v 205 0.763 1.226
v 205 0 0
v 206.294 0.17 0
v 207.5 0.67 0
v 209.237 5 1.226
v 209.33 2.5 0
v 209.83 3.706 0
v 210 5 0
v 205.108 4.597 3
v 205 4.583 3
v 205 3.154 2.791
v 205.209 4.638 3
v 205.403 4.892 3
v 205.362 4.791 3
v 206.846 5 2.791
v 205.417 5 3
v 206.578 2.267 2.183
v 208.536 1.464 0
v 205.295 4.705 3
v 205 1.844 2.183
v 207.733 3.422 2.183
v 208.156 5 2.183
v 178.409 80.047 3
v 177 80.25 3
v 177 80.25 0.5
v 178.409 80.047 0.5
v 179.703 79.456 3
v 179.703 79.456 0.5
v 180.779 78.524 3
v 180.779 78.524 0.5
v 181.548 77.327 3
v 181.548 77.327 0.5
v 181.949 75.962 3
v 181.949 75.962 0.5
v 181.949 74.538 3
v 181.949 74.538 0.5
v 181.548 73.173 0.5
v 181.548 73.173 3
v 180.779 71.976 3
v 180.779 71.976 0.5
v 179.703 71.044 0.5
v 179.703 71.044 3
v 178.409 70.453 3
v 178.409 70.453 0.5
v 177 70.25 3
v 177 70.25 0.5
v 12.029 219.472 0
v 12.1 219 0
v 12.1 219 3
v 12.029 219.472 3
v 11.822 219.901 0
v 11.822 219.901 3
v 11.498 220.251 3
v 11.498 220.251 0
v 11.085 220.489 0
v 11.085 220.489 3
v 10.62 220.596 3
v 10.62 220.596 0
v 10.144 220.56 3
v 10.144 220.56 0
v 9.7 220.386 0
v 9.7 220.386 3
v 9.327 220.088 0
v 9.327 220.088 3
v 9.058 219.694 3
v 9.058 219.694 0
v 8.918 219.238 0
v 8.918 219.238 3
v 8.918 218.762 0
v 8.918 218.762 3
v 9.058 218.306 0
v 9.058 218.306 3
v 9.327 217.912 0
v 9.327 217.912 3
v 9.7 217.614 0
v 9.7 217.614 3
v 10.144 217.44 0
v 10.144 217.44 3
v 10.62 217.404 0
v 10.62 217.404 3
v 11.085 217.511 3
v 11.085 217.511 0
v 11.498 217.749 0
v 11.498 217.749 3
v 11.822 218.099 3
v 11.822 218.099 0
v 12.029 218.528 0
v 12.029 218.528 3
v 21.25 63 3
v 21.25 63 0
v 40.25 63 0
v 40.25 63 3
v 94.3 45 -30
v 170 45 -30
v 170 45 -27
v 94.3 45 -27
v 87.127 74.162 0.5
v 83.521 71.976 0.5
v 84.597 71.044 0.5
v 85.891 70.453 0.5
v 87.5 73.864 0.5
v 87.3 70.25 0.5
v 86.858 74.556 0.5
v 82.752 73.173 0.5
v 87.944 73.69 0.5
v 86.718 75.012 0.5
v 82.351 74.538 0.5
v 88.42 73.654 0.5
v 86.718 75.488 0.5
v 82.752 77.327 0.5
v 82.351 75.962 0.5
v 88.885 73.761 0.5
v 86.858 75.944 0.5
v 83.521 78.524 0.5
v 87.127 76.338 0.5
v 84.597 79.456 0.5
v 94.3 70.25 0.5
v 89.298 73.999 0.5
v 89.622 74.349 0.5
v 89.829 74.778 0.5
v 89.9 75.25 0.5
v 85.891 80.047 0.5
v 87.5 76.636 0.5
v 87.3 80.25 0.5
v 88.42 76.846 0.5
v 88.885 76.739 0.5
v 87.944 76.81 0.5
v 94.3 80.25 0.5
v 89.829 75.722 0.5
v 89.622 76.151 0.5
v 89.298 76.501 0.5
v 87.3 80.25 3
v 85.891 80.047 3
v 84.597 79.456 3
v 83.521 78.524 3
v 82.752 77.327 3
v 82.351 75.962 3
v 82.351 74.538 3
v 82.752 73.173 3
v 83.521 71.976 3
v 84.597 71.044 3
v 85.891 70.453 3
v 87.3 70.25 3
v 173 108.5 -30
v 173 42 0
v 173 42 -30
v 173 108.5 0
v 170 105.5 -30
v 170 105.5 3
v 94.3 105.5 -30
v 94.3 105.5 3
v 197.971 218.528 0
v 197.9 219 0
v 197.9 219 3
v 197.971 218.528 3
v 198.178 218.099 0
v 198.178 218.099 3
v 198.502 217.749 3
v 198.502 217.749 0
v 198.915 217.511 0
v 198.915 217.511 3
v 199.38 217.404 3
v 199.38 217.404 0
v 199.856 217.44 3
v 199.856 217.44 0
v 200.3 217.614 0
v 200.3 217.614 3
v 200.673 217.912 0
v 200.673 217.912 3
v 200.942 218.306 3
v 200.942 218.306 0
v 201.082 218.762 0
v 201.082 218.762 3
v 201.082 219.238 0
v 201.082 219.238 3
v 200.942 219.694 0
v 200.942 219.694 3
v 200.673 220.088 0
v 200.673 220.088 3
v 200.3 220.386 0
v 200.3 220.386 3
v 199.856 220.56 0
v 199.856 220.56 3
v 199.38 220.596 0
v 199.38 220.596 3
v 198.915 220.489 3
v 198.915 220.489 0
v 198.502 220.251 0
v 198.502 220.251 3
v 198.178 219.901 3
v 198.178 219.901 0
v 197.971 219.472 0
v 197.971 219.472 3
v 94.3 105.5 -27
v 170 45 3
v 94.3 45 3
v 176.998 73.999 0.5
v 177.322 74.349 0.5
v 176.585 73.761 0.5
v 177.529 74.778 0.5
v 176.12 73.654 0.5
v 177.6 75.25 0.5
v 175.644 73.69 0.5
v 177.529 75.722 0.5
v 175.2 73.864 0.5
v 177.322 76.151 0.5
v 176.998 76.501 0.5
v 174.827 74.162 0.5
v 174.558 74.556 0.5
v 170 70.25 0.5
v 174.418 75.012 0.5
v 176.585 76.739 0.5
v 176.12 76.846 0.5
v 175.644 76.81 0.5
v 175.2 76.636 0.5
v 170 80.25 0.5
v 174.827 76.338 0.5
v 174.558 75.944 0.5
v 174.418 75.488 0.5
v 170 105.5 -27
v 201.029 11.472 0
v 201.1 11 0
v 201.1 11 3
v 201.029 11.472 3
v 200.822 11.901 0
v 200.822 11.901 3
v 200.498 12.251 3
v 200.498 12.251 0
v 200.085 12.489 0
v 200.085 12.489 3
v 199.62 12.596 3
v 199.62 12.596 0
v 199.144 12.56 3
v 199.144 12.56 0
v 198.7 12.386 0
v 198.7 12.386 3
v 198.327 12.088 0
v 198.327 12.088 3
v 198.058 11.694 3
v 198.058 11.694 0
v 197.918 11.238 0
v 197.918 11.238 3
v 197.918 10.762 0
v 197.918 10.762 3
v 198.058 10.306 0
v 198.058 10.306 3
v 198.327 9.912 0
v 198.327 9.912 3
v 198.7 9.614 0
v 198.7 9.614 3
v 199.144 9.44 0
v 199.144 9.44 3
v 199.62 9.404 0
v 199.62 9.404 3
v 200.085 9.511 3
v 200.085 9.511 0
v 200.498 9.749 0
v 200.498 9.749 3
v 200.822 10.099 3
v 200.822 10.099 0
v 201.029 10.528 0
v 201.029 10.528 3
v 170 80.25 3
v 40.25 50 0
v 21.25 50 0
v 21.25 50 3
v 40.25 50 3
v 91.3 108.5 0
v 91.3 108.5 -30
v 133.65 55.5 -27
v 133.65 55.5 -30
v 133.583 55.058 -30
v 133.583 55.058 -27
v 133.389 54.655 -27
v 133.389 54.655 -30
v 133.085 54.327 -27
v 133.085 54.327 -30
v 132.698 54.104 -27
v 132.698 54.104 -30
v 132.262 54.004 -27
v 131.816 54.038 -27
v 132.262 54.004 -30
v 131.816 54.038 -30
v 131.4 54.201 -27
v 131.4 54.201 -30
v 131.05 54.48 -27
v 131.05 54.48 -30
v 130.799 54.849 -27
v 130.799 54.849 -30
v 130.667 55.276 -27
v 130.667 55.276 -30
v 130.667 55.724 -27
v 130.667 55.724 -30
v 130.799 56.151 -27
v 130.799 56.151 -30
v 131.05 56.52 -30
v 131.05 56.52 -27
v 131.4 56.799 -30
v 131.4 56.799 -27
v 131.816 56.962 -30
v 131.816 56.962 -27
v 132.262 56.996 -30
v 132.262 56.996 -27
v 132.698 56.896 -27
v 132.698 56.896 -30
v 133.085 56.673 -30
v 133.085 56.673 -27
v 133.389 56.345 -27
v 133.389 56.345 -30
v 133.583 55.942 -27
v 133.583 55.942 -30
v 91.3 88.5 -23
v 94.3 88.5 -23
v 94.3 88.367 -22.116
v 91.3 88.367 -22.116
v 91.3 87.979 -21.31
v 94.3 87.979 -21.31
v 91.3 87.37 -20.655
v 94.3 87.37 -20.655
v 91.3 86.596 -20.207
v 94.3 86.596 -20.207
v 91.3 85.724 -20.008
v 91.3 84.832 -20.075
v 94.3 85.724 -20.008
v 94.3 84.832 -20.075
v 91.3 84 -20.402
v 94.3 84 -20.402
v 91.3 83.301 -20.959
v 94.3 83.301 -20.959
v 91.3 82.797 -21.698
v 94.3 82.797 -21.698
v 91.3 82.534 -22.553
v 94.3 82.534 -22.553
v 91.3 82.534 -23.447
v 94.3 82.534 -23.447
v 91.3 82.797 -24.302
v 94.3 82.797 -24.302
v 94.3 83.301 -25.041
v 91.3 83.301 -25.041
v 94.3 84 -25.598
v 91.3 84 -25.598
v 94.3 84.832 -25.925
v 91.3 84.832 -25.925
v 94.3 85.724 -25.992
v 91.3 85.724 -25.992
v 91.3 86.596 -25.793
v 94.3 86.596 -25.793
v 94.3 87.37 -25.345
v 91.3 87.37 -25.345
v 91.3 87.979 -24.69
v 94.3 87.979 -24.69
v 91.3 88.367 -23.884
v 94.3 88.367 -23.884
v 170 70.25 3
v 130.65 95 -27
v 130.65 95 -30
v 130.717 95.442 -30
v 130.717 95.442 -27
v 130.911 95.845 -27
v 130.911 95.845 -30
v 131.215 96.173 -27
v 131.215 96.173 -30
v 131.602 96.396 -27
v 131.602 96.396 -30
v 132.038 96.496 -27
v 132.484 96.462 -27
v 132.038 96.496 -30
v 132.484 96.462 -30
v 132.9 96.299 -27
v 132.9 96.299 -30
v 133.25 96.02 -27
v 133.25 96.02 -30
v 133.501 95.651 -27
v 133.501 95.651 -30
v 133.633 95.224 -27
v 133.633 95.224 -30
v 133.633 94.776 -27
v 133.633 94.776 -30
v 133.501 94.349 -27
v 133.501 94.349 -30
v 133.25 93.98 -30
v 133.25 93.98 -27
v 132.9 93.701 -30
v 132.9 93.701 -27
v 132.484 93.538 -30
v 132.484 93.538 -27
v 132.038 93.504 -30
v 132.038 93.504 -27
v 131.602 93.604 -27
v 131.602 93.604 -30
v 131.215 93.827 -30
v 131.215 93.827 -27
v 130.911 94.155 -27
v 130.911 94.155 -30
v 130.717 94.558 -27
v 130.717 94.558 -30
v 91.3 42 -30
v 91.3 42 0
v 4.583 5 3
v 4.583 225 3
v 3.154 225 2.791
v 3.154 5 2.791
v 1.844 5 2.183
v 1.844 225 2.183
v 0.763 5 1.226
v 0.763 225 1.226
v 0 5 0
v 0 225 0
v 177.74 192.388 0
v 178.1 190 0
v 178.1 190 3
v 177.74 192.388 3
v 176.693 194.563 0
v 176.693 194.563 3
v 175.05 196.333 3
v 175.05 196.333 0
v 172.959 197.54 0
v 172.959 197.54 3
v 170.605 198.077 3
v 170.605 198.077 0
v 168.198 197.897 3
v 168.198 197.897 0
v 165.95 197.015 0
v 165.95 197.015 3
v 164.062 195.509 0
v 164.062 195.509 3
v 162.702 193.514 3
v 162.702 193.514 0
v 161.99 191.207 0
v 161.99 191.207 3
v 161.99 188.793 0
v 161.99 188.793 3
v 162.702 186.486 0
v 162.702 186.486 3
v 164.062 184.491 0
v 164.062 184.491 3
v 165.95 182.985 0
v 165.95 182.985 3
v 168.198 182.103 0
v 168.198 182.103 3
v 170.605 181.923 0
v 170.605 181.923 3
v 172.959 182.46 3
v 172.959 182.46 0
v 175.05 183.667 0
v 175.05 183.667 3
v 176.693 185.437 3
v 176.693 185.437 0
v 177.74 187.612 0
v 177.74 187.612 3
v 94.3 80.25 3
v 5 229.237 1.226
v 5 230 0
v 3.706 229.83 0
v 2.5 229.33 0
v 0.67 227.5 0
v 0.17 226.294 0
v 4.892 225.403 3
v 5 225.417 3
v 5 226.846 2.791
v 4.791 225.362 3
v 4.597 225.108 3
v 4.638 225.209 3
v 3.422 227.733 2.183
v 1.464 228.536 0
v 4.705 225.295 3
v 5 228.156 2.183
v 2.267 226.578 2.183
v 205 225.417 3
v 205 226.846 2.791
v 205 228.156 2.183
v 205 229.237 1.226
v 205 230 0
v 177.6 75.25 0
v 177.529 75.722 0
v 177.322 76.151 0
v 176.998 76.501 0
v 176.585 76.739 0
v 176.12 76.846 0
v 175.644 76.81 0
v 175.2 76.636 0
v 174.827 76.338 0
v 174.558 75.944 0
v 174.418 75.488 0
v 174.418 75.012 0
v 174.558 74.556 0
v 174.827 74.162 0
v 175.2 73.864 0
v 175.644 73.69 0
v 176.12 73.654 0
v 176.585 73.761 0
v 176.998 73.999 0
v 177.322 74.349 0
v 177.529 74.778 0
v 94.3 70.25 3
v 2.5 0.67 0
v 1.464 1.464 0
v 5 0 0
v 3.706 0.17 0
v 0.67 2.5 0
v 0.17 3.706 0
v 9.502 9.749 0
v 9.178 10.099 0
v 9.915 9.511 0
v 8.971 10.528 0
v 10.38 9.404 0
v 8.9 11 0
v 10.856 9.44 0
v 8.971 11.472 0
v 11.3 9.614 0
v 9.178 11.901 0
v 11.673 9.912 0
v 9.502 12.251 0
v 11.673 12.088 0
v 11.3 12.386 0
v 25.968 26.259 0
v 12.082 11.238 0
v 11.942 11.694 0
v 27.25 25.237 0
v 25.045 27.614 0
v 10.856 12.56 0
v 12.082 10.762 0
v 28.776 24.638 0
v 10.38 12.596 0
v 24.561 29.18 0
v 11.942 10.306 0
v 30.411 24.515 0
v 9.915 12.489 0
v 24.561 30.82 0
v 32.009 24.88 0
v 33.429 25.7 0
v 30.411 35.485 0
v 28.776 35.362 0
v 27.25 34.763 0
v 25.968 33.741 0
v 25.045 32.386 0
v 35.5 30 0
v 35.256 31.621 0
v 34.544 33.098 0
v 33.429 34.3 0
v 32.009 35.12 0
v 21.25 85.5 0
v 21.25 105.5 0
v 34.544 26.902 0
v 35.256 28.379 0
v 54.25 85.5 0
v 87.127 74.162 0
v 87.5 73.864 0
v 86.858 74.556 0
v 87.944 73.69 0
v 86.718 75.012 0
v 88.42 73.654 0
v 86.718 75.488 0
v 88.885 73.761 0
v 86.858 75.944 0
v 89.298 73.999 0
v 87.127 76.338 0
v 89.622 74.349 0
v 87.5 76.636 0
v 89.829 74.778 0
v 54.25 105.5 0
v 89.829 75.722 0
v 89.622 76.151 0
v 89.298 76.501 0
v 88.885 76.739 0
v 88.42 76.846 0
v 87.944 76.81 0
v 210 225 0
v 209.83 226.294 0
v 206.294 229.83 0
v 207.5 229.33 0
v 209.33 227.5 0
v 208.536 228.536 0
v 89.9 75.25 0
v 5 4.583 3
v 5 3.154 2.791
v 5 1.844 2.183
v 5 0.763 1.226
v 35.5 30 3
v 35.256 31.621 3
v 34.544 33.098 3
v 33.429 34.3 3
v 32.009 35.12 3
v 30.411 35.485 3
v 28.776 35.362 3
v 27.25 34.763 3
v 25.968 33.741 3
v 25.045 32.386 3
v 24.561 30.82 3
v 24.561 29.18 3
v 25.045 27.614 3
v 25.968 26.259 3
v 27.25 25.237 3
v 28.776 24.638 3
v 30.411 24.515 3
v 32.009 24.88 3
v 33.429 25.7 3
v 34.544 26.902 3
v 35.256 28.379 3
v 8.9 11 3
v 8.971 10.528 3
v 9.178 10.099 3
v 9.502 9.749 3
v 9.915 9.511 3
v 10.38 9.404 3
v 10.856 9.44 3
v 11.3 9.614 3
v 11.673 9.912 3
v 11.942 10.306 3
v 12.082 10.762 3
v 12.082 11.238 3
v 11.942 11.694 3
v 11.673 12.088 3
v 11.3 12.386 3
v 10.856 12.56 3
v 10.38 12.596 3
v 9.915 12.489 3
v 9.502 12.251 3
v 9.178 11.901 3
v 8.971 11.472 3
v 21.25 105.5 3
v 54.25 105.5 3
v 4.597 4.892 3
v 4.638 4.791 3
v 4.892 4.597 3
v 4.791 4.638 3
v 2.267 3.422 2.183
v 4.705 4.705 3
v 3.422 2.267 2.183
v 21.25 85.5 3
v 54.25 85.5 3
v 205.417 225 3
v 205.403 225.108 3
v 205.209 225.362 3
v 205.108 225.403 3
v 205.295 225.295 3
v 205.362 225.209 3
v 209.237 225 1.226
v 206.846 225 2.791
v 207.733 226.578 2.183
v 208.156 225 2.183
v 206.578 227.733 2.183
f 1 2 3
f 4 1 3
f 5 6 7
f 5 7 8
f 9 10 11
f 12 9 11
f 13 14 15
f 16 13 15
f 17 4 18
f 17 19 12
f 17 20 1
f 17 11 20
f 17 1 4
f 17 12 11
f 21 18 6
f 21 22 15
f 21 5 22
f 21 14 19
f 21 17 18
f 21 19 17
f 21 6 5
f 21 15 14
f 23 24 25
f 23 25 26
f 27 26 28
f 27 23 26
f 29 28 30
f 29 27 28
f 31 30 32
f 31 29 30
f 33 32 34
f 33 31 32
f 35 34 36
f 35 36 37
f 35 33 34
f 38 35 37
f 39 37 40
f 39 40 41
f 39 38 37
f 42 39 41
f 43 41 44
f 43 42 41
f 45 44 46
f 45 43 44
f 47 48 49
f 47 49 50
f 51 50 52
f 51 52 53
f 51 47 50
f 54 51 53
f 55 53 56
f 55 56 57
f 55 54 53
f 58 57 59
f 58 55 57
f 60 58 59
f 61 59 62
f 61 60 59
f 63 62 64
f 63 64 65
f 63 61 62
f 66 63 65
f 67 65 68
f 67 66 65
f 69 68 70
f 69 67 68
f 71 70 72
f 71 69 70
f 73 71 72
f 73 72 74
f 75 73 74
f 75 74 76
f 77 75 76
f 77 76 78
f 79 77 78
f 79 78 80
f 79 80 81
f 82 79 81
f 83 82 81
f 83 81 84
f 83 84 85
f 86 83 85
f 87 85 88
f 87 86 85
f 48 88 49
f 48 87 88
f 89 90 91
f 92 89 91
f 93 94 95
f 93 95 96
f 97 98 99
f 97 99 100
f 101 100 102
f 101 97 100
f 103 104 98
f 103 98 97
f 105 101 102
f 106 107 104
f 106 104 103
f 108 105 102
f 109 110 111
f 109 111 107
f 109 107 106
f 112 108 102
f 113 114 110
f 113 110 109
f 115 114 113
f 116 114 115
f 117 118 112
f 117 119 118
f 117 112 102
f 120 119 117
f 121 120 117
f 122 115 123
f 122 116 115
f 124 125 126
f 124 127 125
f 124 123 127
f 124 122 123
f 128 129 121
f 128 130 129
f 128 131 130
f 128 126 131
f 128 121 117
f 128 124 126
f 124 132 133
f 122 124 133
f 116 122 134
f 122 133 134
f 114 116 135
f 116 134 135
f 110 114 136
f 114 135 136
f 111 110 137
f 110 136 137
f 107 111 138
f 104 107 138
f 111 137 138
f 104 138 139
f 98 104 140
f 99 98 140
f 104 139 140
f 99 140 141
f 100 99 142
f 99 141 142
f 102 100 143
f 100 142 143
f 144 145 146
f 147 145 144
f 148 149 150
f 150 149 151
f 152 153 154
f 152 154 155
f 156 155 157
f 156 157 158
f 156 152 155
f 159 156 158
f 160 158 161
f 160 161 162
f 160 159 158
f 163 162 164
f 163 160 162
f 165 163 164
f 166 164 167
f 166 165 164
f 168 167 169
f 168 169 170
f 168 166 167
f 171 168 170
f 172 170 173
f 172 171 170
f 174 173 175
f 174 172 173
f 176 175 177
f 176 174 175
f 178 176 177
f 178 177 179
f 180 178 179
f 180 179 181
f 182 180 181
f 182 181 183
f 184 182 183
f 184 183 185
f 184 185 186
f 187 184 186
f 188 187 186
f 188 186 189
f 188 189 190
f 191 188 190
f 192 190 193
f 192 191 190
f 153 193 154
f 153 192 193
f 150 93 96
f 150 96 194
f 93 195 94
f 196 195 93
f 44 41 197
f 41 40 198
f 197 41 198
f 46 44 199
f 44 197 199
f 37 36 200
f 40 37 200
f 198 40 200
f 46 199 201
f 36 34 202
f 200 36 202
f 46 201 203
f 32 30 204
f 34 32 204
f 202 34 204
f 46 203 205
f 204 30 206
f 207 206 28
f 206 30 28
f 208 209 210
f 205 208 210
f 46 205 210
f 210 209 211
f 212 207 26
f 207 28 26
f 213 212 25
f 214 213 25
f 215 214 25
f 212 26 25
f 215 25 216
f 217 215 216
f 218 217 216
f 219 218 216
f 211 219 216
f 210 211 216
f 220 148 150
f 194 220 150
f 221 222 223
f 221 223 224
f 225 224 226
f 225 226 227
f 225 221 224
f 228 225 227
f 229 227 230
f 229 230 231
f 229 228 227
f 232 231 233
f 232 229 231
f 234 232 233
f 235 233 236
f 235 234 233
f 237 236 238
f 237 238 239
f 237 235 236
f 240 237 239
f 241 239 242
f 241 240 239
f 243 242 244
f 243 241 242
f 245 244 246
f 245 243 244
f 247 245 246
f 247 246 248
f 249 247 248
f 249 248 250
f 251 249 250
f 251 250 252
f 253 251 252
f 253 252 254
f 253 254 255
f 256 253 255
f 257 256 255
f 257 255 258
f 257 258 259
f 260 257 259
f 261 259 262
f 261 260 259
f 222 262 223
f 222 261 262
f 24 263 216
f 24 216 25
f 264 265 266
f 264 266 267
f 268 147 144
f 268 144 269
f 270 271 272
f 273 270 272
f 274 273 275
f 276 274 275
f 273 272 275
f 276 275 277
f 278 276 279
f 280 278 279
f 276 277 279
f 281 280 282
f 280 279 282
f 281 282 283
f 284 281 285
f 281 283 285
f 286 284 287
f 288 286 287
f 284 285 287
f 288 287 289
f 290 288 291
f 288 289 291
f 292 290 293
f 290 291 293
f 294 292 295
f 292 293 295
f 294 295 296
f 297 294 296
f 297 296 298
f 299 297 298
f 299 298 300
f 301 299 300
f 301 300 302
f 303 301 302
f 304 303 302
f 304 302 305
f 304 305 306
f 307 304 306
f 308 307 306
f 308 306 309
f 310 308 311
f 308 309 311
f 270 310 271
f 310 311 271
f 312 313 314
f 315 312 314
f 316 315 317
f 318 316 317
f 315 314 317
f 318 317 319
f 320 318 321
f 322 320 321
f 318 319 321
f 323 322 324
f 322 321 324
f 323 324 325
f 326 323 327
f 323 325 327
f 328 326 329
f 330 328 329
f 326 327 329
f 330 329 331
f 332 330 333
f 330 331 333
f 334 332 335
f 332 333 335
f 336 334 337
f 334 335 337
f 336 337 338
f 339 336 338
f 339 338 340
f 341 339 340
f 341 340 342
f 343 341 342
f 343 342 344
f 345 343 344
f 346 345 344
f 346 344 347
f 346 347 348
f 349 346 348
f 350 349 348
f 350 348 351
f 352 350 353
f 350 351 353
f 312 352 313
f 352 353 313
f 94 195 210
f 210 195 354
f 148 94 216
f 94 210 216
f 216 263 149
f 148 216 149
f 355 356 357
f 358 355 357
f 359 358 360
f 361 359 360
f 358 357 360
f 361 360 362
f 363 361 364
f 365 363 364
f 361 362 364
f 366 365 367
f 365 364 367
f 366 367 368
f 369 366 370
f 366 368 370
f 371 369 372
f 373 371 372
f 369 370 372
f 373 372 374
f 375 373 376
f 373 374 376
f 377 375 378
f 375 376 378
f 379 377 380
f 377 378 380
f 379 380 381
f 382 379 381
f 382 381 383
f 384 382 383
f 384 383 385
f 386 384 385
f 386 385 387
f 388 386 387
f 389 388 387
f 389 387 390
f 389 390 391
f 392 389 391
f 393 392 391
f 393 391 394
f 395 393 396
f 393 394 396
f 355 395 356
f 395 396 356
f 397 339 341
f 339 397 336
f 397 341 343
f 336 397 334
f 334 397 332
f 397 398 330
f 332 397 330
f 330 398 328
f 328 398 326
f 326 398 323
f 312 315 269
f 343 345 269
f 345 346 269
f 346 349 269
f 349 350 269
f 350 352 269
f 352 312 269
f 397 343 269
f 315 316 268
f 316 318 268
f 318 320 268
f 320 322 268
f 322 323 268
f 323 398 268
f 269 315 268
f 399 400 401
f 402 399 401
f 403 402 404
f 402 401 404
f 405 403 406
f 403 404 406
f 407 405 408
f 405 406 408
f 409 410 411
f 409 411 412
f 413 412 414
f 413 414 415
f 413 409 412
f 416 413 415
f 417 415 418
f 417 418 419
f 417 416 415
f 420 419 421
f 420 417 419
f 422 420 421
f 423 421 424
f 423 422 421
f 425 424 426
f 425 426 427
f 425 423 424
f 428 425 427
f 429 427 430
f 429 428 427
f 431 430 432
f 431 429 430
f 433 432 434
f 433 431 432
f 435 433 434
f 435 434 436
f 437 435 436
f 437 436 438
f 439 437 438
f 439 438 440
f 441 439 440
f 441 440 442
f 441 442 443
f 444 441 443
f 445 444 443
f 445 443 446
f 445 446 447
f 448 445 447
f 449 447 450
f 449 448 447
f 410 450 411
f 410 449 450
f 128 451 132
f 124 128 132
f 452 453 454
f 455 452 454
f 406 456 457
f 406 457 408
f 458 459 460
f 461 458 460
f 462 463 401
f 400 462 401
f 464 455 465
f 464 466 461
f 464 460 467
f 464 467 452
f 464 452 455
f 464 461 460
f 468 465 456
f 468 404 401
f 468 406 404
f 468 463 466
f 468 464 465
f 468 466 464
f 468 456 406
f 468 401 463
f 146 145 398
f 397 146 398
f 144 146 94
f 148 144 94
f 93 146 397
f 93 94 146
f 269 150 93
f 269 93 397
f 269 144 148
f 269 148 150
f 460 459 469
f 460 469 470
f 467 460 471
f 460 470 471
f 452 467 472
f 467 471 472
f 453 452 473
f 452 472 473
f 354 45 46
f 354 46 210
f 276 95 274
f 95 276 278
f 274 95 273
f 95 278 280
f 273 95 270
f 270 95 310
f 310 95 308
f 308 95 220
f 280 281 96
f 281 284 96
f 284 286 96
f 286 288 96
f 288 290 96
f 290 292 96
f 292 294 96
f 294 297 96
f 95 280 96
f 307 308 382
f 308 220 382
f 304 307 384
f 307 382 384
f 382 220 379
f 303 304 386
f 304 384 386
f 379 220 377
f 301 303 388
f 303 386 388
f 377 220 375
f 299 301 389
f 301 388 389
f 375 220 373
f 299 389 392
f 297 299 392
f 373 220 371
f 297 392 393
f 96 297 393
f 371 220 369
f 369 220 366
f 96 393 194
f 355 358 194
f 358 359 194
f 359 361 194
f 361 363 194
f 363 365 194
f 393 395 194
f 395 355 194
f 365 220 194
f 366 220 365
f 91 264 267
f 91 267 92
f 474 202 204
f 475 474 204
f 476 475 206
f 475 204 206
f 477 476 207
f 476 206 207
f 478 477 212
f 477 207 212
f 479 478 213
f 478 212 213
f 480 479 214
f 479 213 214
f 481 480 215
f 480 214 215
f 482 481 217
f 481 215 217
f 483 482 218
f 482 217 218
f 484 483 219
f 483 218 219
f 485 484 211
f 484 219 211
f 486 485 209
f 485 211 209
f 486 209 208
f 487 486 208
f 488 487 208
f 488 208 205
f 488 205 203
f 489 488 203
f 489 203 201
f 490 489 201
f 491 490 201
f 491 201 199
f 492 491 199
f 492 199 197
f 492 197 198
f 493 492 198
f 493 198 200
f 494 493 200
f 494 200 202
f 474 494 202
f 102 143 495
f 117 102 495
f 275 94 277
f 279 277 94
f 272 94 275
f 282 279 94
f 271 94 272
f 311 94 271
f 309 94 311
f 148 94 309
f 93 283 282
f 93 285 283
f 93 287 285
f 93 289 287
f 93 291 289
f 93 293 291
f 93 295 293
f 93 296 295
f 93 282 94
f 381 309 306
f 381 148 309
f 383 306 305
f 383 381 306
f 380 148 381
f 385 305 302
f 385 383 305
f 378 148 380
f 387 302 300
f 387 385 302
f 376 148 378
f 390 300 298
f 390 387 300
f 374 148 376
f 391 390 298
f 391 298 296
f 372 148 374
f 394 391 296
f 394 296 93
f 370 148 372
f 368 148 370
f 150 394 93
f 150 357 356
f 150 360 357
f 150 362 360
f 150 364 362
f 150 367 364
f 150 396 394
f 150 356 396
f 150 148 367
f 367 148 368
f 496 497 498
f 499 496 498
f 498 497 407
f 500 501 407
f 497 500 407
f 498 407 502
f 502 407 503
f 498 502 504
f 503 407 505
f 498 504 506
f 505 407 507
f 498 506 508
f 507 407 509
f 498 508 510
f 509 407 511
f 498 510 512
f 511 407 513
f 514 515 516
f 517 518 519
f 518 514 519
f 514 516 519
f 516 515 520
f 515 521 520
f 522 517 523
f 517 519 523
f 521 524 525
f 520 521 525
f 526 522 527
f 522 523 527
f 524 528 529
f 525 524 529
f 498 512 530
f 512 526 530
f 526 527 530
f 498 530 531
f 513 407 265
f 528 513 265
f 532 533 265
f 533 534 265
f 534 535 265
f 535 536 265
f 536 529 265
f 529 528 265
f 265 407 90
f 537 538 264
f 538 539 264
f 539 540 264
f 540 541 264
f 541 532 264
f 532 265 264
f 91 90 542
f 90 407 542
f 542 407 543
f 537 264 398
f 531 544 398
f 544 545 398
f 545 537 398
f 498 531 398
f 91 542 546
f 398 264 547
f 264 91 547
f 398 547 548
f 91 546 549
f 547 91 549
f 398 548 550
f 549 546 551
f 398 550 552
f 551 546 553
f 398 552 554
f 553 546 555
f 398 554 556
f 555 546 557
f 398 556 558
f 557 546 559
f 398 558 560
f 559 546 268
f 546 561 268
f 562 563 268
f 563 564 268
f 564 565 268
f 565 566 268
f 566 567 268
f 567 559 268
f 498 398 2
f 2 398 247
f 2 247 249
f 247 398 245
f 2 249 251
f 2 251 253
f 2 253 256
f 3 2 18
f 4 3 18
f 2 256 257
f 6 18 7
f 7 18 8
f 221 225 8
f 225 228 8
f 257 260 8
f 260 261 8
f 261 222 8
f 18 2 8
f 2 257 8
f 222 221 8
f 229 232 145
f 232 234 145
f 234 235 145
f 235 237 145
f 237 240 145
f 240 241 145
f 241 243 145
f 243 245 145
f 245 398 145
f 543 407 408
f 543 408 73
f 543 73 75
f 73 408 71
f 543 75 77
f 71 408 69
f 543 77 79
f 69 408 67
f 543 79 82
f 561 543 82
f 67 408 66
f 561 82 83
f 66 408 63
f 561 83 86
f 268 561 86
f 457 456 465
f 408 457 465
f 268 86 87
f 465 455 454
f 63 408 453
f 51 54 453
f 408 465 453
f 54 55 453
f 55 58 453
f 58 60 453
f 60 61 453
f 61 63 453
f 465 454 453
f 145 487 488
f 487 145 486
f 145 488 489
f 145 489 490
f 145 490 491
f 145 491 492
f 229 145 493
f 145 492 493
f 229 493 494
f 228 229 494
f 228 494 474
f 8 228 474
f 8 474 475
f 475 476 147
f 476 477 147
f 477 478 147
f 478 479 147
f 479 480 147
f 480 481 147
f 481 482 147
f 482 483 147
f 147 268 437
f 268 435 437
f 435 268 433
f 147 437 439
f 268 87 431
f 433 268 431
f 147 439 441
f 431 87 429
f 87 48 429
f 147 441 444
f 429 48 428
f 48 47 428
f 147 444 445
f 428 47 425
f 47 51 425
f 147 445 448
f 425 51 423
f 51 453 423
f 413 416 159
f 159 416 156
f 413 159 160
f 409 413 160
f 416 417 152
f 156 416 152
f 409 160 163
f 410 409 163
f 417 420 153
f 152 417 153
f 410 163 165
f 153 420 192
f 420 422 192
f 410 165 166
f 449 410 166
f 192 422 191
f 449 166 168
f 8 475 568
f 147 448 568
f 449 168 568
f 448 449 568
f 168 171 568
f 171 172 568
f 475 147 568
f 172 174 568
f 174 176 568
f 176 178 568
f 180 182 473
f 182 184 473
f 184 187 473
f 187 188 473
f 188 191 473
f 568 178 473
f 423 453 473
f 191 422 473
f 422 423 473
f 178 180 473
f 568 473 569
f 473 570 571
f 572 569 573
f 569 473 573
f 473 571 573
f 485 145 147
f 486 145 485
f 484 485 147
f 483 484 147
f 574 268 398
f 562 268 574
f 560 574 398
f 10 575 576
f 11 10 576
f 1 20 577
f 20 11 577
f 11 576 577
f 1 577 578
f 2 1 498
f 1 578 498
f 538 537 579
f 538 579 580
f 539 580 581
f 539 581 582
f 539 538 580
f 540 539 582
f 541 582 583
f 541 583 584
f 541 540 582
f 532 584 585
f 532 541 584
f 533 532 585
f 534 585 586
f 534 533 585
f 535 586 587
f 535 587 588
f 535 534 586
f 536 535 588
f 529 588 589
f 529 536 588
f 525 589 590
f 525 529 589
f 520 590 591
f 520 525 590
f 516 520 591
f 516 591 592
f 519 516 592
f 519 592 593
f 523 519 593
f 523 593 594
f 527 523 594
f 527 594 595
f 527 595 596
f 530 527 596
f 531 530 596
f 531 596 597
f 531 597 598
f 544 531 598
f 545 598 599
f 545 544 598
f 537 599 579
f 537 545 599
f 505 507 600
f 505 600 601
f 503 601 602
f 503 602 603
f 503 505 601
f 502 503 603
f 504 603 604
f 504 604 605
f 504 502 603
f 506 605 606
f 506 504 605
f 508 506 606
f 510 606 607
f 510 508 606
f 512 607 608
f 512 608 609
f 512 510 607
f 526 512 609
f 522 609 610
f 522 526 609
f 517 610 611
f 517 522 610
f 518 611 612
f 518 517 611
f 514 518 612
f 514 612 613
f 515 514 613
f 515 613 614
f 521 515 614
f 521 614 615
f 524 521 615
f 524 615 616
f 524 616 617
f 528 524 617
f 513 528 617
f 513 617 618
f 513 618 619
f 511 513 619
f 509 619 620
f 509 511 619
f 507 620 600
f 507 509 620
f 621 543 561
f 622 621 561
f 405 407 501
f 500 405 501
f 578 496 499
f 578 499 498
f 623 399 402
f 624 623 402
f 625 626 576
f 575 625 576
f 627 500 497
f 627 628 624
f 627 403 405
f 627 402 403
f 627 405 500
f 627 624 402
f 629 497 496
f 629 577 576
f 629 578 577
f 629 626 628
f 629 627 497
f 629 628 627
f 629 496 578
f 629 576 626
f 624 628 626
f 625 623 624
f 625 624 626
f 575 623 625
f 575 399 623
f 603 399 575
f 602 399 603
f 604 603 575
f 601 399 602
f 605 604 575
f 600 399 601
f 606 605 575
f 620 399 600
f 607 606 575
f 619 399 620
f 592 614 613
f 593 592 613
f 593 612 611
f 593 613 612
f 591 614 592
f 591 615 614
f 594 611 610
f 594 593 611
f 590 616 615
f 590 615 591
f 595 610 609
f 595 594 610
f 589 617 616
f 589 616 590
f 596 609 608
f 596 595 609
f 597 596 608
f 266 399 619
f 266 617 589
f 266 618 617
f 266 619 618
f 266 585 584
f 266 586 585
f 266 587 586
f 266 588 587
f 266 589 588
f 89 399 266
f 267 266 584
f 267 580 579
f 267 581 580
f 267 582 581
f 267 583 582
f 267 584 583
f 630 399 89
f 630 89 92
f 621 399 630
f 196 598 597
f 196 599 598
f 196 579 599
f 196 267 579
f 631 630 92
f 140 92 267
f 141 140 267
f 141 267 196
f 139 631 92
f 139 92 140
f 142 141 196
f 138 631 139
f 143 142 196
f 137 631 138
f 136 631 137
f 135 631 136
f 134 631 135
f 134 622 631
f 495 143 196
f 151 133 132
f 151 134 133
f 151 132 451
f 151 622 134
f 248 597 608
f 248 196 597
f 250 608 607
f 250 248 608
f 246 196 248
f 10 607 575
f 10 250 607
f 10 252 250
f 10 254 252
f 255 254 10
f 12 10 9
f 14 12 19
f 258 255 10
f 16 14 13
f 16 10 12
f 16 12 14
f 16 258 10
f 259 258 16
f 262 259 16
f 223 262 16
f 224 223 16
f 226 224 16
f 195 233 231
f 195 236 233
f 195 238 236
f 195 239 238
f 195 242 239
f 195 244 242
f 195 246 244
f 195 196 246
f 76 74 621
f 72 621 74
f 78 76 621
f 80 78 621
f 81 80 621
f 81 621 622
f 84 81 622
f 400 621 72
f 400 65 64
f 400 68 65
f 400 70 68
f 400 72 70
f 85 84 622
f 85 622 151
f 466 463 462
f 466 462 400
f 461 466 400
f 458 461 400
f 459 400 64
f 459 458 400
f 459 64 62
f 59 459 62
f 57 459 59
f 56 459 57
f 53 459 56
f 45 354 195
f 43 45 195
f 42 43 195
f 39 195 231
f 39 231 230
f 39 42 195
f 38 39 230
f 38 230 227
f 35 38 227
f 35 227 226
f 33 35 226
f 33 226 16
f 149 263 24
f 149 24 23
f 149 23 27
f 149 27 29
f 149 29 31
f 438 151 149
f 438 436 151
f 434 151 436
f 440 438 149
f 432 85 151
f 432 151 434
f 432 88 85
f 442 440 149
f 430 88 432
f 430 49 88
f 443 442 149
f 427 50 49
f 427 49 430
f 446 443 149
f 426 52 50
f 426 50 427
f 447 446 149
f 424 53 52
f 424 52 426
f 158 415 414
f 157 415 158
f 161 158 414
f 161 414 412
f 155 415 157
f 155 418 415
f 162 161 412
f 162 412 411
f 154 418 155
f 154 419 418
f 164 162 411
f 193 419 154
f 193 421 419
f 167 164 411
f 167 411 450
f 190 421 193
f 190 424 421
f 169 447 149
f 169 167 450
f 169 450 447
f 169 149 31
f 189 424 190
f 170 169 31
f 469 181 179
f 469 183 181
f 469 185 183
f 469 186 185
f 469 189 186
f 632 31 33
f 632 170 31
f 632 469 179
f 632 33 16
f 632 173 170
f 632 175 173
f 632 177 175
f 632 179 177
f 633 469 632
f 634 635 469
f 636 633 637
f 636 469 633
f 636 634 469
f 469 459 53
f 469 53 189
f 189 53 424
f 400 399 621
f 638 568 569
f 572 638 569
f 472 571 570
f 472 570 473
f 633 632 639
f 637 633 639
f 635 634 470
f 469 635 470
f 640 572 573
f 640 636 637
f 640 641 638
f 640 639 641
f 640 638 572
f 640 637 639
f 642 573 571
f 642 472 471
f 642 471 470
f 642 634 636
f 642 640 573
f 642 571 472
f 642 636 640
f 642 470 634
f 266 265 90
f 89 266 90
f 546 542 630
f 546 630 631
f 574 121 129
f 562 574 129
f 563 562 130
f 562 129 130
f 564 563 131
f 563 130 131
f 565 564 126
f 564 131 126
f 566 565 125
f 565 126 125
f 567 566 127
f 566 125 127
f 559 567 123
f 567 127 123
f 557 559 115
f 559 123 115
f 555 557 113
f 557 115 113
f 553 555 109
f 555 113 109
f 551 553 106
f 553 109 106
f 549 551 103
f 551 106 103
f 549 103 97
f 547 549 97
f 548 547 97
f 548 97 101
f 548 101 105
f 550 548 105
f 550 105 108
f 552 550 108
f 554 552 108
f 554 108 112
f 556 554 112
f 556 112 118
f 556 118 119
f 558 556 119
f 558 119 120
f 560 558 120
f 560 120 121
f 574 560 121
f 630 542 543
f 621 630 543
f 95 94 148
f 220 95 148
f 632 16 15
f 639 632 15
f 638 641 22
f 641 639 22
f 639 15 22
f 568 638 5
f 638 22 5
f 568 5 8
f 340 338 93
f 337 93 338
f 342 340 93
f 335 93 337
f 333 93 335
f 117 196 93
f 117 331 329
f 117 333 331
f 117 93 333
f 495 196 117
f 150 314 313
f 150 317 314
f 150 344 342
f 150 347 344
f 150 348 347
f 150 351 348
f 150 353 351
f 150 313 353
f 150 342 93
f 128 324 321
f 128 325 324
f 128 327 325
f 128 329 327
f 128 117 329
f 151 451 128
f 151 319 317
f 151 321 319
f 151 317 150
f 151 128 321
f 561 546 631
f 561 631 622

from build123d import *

# Parameters (mm, degrees)
SKETCH1_R           = 1.6
SKETCH1_R_2         = 8.1
SKETCH1_R_3         = 5.5
SKETCH1_W           = 19
SKETCH1_H           = 13
SKETCH1_W_2         = 75.7
SKETCH1_H_2         = 60.5
SKETCH1_W_3         = 33
SKETCH1_H_3         = 20
BOSS_EXTRUDE1_DEPTH = 3
SKETCH2_W           = 81.7
SKETCH2_H           = 66.5
SKETCH2_W_2         = 75.7
SKETCH2_H_2         = 60.5
BOSS_EXTRUDE2_DEPTH = 30
SKETCH3_W           = 75.7
SKETCH3_H           = 60.5
SKETCH3_R           = 1.5
BOSS_EXTRUDE3_DEPTH = 3
SKETCH4_R           = 3
CUT_EXTRUDE1_DEPTH  = 3
FILLET1_R           = 5
CUT_EXTRUDE2_DEPTH  = 2.5
SKETCH6_R           = 1.6
CUT_EXTRUDE3_DEPTH  = 313.938092919


with BuildPart() as part:
    # Sketch1 → Boss-Extrude1 (new body)
    with BuildSketch(Plane.XY):
        with BuildLine():
            Line((5, 0), (205, 0))
            ThreePointArc((205, 0), (208.535533906, 1.464466094), (210, 5))
            Line((210, 5), (210, 225))
            ThreePointArc((210, 225), (208.535533906, 228.535533906), (205, 230))
            Line((205, 230), (5, 230))
            ThreePointArc((5, 230), (1.464466094, 228.535533906), (0, 225))
            Line((0, 225), (0, 5))
            ThreePointArc((0, 5), (1.464466094, 1.464466094), (5, 0))
        make_face()
        with Locations((10.5, 219)):
            Circle(SKETCH1_R, mode=Mode.SUBTRACT)
        with Locations(Location((10.5, 11, 0), (0, 0, 180))):
            Circle(SKETCH1_R, mode=Mode.SUBTRACT)
        with Locations((199.5, 11)):
            Circle(SKETCH1_R, mode=Mode.SUBTRACT)
        with Locations(Location((199.5, 219, 0), (0, 0, 180))):
            Circle(SKETCH1_R, mode=Mode.SUBTRACT)
        with Locations((170, 190)):
            Circle(SKETCH1_R_2, mode=Mode.SUBTRACT)
        with Locations((30, 30)):
            Circle(SKETCH1_R_3, mode=Mode.SUBTRACT)
        with Locations((30.75, 56.5)):
            Rectangle(SKETCH1_W, SKETCH1_H, mode=Mode.SUBTRACT)
        with Locations((132.15, 75.25)):
            Rectangle(SKETCH1_W_2, SKETCH1_H_2, mode=Mode.SUBTRACT)
        with Locations((37.75, 95.5)):
            Rectangle(SKETCH1_W_3, SKETCH1_H_3, mode=Mode.SUBTRACT)
    extrude(amount=BOSS_EXTRUDE1_DEPTH)

    # Sketch2 → Boss-Extrude2 (add)
    with BuildSketch(Plane(origin=(0, 0, 0), x_dir=(-1, 0, 0), z_dir=(0, 0, -1))):
        with Locations((-132.15, 75.25)):
            Rectangle(SKETCH2_W, SKETCH2_H)
        with Locations((-132.15, 75.25)):
            Rectangle(SKETCH2_W_2, SKETCH2_H_2, mode=Mode.SUBTRACT)
    extrude(amount=BOSS_EXTRUDE2_DEPTH)

    # Sketch4 → Cut-Extrude1 (cut)
    with BuildSketch(Plane(origin=(94.3, 0, 0), x_dir=(0, 0, -1), z_dir=(1, 0, 0))):
        with Locations(Location((23, 85.5, 0), (0, 0, 90))):
            Circle(SKETCH4_R)
    extrude(amount=-CUT_EXTRUDE1_DEPTH, mode=Mode.SUBTRACT)

    # Fillet1
    # the kernel refuses this fillet: 5 mm, written as the material it takes off along each edge
    with BuildSketch(Plane(origin=(205, 225, 3), x_dir=(1, 0, 0), z_dir=(0, -1, 0))) as fillet1_piece_1:
        with BuildLine():
            CenterArc((0.417424305, -5), FILLET1_R, 23.578178478, 66.421821522)
            Line((5, -3), (5.091651514, -2.96))
            ThreePointArc((5.091651514, -2.96), (5.1, -1.5), (5.1, 0))
            Line((5.1, 0), (5, 0.1))
            Line((5, 0.1), (0.417424305, 0.1))
            Line((0.417424305, 0.1), (0.417424305, 0))
        make_face()
    revolve(axis=Axis((205, 225, 3), (0, 0, 1)), revolution_arc=90, mode=Mode.SUBTRACT)
    with BuildSketch(Plane(origin=(210, 5, 3), x_dir=(-1, 0, 0), z_dir=(0, 1, 0))) as fillet1_piece_2:
        with BuildLine():
            CenterArc((4.582575695, -5), FILLET1_R, 90, 66.421821522)
            Line((0, -3), (-0.091651514, -2.96))
            ThreePointArc((-0.091651514, -2.96), (-0.1, -1.5), (-0.1, 0))
            Line((-0.1, 0), (0, 0.1))
            Line((0, 0.1), (4.582575695, 0.1))
            Line((4.582575695, 0.1), (4.582575695, 0))
        make_face()
    extrude(amount=220, mode=Mode.SUBTRACT)
    with BuildSketch(Plane(origin=(205, 5, 3), x_dir=(0, -1, 0), z_dir=(-1, 0, 0))) as fillet1_piece_3:
        with BuildLine():
            CenterArc((0.417424305, -5), FILLET1_R, 23.578178478, 66.421821522)
            Line((5, -3), (5.091651514, -2.96))
            ThreePointArc((5.091651514, -2.96), (5.1, -1.5), (5.1, 0))
            Line((5.1, 0), (5, 0.1))
            Line((5, 0.1), (0.417424305, 0.1))
            Line((0.417424305, 0.1), (0.417424305, 0))
        make_face()
    revolve(axis=Axis((205, 5, 3), (0, 0, 1)), revolution_arc=90, mode=Mode.SUBTRACT)
    with BuildSketch(Plane(origin=(5, 0, 3), x_dir=(0, 1, 0), z_dir=(1, 0, 0)), Plane(origin=(205, 230, 3), x_dir=(0, -1, 0), z_dir=(-1, 0, 0))) as fillet1_piece_4:
        with BuildLine():
            CenterArc((4.582575695, -5), FILLET1_R, 90, 66.421821522)
            Line((0, -3), (-0.091651514, -2.96))
            ThreePointArc((-0.091651514, -2.96), (-0.1, -1.5), (-0.1, 0))
            Line((-0.1, 0), (0, 0.1))
            Line((0, 0.1), (4.582575695, 0.1))
            Line((4.582575695, 0.1), (4.582575695, 0))
        make_face()
    extrude(amount=200, mode=Mode.SUBTRACT)
    with BuildSketch(Plane(origin=(5, 5, 3), x_dir=(-1, 0, 0), z_dir=(0, 1, 0))) as fillet1_piece_5:
        with BuildLine():
            CenterArc((0.417424305, -5), FILLET1_R, 23.578178478, 66.421821522)
            Line((0.417424305, 0), (0.417424305, 0.1))
            Line((0.417424305, 0.1), (5, 0.1))
            Line((5, 0.1), (5.1, 0))
            ThreePointArc((5.1, 0), (5.1, -1.5), (5.091651514, -2.96))
            Line((5.091651514, -2.96), (5, -3))
        make_face()
    revolve(axis=Axis((5, 5, 3), (0, 0, 1)), revolution_arc=90, mode=Mode.SUBTRACT)
    with BuildSketch(Plane(origin=(0, 225, 3), x_dir=(0, 0, -1), z_dir=(0, -1, 0))) as fillet1_piece_6:
        with BuildLine():
            CenterArc((5, 4.582575695), FILLET1_R, 180, 66.421821522)
            Line((0, 4.582575695), (-0.1, 4.582575695))
            Line((-0.1, 4.582575695), (-0.1, 0))
            Line((-0.1, 0), (0, -0.1))
            ThreePointArc((0, -0.1), (1.5, -0.1), (2.96, -0.091651514))
            Line((2.96, -0.091651514), (3, 0))
        make_face()
    extrude(amount=220, mode=Mode.SUBTRACT)
    with BuildSketch(Plane(origin=(5, 225, 3), x_dir=(0, 1, 0), z_dir=(1, 0, 0))) as fillet1_piece_7:
        with BuildLine():
            CenterArc((0.417424305, -5), FILLET1_R, 23.578178478, 66.421821522)
            Line((0.417424305, 0), (0.417424305, 0.1))
            Line((0.417424305, 0.1), (5, 0.1))
            Line((5, 0.1), (5.1, 0))
            ThreePointArc((5.1, 0), (5.1, -1.5), (5.091651514, -2.96))
            Line((5.091651514, -2.96), (5, -3))
        make_face()
    revolve(axis=Axis((5, 225, 3), (0, 0, 1)), revolution_arc=90, mode=Mode.SUBTRACT)

    # Sketch5 → Cut-Extrude2 (cut)
    with BuildSketch(Plane.XY.offset(3)):
        with BuildLine():
            Line((94.3, 80.25), (87.3, 80.25))
            ThreePointArc((87.3, 80.25), (82.3, 75.25), (87.3, 70.25))
            Line((87.3, 70.25), (94.3, 70.25))
            Line((94.3, 70.25), (94.3, 80.25))
        make_face()
        with BuildLine():
            Line((170, 80.25), (177, 80.25))
            ThreePointArc((177, 80.25), (182, 75.25), (177, 70.25))
            Line((177, 70.25), (170, 70.25))
            Line((170, 70.25), (170, 80.25))
        make_face()
    extrude(amount=-CUT_EXTRUDE2_DEPTH, mode=Mode.SUBTRACT)

    # Sketch6 → Cut-Extrude3 (cut, through all)
    with BuildSketch(Plane.XY.offset(0.5)):
        with Locations((88.3, 75.25)):
            Circle(SKETCH6_R)
        with Locations((176, 75.25)):
            Circle(SKETCH6_R)
    extrude(amount=-CUT_EXTRUDE3_DEPTH, mode=Mode.SUBTRACT)


with BuildPart() as body_2:
    # Sketch3 → Boss-Extrude3 (new body)
    with BuildSketch(Plane(origin=(0, 0, -30), x_dir=(-1, 0, 0), z_dir=(0, 0, -1))):
        with Locations((-132.15, 75.25)):
            Rectangle(SKETCH3_W, SKETCH3_H)
        with Locations((-132.15, 95)):
            Circle(SKETCH3_R, mode=Mode.SUBTRACT)
        with Locations(Location((-132.15, 55.5, 0), (0, 0, 180))):
            Circle(SKETCH3_R, mode=Mode.SUBTRACT)
    extrude(amount=-BOSS_EXTRUDE3_DEPTH)


solid = Compound([part.part, body_2.part])
